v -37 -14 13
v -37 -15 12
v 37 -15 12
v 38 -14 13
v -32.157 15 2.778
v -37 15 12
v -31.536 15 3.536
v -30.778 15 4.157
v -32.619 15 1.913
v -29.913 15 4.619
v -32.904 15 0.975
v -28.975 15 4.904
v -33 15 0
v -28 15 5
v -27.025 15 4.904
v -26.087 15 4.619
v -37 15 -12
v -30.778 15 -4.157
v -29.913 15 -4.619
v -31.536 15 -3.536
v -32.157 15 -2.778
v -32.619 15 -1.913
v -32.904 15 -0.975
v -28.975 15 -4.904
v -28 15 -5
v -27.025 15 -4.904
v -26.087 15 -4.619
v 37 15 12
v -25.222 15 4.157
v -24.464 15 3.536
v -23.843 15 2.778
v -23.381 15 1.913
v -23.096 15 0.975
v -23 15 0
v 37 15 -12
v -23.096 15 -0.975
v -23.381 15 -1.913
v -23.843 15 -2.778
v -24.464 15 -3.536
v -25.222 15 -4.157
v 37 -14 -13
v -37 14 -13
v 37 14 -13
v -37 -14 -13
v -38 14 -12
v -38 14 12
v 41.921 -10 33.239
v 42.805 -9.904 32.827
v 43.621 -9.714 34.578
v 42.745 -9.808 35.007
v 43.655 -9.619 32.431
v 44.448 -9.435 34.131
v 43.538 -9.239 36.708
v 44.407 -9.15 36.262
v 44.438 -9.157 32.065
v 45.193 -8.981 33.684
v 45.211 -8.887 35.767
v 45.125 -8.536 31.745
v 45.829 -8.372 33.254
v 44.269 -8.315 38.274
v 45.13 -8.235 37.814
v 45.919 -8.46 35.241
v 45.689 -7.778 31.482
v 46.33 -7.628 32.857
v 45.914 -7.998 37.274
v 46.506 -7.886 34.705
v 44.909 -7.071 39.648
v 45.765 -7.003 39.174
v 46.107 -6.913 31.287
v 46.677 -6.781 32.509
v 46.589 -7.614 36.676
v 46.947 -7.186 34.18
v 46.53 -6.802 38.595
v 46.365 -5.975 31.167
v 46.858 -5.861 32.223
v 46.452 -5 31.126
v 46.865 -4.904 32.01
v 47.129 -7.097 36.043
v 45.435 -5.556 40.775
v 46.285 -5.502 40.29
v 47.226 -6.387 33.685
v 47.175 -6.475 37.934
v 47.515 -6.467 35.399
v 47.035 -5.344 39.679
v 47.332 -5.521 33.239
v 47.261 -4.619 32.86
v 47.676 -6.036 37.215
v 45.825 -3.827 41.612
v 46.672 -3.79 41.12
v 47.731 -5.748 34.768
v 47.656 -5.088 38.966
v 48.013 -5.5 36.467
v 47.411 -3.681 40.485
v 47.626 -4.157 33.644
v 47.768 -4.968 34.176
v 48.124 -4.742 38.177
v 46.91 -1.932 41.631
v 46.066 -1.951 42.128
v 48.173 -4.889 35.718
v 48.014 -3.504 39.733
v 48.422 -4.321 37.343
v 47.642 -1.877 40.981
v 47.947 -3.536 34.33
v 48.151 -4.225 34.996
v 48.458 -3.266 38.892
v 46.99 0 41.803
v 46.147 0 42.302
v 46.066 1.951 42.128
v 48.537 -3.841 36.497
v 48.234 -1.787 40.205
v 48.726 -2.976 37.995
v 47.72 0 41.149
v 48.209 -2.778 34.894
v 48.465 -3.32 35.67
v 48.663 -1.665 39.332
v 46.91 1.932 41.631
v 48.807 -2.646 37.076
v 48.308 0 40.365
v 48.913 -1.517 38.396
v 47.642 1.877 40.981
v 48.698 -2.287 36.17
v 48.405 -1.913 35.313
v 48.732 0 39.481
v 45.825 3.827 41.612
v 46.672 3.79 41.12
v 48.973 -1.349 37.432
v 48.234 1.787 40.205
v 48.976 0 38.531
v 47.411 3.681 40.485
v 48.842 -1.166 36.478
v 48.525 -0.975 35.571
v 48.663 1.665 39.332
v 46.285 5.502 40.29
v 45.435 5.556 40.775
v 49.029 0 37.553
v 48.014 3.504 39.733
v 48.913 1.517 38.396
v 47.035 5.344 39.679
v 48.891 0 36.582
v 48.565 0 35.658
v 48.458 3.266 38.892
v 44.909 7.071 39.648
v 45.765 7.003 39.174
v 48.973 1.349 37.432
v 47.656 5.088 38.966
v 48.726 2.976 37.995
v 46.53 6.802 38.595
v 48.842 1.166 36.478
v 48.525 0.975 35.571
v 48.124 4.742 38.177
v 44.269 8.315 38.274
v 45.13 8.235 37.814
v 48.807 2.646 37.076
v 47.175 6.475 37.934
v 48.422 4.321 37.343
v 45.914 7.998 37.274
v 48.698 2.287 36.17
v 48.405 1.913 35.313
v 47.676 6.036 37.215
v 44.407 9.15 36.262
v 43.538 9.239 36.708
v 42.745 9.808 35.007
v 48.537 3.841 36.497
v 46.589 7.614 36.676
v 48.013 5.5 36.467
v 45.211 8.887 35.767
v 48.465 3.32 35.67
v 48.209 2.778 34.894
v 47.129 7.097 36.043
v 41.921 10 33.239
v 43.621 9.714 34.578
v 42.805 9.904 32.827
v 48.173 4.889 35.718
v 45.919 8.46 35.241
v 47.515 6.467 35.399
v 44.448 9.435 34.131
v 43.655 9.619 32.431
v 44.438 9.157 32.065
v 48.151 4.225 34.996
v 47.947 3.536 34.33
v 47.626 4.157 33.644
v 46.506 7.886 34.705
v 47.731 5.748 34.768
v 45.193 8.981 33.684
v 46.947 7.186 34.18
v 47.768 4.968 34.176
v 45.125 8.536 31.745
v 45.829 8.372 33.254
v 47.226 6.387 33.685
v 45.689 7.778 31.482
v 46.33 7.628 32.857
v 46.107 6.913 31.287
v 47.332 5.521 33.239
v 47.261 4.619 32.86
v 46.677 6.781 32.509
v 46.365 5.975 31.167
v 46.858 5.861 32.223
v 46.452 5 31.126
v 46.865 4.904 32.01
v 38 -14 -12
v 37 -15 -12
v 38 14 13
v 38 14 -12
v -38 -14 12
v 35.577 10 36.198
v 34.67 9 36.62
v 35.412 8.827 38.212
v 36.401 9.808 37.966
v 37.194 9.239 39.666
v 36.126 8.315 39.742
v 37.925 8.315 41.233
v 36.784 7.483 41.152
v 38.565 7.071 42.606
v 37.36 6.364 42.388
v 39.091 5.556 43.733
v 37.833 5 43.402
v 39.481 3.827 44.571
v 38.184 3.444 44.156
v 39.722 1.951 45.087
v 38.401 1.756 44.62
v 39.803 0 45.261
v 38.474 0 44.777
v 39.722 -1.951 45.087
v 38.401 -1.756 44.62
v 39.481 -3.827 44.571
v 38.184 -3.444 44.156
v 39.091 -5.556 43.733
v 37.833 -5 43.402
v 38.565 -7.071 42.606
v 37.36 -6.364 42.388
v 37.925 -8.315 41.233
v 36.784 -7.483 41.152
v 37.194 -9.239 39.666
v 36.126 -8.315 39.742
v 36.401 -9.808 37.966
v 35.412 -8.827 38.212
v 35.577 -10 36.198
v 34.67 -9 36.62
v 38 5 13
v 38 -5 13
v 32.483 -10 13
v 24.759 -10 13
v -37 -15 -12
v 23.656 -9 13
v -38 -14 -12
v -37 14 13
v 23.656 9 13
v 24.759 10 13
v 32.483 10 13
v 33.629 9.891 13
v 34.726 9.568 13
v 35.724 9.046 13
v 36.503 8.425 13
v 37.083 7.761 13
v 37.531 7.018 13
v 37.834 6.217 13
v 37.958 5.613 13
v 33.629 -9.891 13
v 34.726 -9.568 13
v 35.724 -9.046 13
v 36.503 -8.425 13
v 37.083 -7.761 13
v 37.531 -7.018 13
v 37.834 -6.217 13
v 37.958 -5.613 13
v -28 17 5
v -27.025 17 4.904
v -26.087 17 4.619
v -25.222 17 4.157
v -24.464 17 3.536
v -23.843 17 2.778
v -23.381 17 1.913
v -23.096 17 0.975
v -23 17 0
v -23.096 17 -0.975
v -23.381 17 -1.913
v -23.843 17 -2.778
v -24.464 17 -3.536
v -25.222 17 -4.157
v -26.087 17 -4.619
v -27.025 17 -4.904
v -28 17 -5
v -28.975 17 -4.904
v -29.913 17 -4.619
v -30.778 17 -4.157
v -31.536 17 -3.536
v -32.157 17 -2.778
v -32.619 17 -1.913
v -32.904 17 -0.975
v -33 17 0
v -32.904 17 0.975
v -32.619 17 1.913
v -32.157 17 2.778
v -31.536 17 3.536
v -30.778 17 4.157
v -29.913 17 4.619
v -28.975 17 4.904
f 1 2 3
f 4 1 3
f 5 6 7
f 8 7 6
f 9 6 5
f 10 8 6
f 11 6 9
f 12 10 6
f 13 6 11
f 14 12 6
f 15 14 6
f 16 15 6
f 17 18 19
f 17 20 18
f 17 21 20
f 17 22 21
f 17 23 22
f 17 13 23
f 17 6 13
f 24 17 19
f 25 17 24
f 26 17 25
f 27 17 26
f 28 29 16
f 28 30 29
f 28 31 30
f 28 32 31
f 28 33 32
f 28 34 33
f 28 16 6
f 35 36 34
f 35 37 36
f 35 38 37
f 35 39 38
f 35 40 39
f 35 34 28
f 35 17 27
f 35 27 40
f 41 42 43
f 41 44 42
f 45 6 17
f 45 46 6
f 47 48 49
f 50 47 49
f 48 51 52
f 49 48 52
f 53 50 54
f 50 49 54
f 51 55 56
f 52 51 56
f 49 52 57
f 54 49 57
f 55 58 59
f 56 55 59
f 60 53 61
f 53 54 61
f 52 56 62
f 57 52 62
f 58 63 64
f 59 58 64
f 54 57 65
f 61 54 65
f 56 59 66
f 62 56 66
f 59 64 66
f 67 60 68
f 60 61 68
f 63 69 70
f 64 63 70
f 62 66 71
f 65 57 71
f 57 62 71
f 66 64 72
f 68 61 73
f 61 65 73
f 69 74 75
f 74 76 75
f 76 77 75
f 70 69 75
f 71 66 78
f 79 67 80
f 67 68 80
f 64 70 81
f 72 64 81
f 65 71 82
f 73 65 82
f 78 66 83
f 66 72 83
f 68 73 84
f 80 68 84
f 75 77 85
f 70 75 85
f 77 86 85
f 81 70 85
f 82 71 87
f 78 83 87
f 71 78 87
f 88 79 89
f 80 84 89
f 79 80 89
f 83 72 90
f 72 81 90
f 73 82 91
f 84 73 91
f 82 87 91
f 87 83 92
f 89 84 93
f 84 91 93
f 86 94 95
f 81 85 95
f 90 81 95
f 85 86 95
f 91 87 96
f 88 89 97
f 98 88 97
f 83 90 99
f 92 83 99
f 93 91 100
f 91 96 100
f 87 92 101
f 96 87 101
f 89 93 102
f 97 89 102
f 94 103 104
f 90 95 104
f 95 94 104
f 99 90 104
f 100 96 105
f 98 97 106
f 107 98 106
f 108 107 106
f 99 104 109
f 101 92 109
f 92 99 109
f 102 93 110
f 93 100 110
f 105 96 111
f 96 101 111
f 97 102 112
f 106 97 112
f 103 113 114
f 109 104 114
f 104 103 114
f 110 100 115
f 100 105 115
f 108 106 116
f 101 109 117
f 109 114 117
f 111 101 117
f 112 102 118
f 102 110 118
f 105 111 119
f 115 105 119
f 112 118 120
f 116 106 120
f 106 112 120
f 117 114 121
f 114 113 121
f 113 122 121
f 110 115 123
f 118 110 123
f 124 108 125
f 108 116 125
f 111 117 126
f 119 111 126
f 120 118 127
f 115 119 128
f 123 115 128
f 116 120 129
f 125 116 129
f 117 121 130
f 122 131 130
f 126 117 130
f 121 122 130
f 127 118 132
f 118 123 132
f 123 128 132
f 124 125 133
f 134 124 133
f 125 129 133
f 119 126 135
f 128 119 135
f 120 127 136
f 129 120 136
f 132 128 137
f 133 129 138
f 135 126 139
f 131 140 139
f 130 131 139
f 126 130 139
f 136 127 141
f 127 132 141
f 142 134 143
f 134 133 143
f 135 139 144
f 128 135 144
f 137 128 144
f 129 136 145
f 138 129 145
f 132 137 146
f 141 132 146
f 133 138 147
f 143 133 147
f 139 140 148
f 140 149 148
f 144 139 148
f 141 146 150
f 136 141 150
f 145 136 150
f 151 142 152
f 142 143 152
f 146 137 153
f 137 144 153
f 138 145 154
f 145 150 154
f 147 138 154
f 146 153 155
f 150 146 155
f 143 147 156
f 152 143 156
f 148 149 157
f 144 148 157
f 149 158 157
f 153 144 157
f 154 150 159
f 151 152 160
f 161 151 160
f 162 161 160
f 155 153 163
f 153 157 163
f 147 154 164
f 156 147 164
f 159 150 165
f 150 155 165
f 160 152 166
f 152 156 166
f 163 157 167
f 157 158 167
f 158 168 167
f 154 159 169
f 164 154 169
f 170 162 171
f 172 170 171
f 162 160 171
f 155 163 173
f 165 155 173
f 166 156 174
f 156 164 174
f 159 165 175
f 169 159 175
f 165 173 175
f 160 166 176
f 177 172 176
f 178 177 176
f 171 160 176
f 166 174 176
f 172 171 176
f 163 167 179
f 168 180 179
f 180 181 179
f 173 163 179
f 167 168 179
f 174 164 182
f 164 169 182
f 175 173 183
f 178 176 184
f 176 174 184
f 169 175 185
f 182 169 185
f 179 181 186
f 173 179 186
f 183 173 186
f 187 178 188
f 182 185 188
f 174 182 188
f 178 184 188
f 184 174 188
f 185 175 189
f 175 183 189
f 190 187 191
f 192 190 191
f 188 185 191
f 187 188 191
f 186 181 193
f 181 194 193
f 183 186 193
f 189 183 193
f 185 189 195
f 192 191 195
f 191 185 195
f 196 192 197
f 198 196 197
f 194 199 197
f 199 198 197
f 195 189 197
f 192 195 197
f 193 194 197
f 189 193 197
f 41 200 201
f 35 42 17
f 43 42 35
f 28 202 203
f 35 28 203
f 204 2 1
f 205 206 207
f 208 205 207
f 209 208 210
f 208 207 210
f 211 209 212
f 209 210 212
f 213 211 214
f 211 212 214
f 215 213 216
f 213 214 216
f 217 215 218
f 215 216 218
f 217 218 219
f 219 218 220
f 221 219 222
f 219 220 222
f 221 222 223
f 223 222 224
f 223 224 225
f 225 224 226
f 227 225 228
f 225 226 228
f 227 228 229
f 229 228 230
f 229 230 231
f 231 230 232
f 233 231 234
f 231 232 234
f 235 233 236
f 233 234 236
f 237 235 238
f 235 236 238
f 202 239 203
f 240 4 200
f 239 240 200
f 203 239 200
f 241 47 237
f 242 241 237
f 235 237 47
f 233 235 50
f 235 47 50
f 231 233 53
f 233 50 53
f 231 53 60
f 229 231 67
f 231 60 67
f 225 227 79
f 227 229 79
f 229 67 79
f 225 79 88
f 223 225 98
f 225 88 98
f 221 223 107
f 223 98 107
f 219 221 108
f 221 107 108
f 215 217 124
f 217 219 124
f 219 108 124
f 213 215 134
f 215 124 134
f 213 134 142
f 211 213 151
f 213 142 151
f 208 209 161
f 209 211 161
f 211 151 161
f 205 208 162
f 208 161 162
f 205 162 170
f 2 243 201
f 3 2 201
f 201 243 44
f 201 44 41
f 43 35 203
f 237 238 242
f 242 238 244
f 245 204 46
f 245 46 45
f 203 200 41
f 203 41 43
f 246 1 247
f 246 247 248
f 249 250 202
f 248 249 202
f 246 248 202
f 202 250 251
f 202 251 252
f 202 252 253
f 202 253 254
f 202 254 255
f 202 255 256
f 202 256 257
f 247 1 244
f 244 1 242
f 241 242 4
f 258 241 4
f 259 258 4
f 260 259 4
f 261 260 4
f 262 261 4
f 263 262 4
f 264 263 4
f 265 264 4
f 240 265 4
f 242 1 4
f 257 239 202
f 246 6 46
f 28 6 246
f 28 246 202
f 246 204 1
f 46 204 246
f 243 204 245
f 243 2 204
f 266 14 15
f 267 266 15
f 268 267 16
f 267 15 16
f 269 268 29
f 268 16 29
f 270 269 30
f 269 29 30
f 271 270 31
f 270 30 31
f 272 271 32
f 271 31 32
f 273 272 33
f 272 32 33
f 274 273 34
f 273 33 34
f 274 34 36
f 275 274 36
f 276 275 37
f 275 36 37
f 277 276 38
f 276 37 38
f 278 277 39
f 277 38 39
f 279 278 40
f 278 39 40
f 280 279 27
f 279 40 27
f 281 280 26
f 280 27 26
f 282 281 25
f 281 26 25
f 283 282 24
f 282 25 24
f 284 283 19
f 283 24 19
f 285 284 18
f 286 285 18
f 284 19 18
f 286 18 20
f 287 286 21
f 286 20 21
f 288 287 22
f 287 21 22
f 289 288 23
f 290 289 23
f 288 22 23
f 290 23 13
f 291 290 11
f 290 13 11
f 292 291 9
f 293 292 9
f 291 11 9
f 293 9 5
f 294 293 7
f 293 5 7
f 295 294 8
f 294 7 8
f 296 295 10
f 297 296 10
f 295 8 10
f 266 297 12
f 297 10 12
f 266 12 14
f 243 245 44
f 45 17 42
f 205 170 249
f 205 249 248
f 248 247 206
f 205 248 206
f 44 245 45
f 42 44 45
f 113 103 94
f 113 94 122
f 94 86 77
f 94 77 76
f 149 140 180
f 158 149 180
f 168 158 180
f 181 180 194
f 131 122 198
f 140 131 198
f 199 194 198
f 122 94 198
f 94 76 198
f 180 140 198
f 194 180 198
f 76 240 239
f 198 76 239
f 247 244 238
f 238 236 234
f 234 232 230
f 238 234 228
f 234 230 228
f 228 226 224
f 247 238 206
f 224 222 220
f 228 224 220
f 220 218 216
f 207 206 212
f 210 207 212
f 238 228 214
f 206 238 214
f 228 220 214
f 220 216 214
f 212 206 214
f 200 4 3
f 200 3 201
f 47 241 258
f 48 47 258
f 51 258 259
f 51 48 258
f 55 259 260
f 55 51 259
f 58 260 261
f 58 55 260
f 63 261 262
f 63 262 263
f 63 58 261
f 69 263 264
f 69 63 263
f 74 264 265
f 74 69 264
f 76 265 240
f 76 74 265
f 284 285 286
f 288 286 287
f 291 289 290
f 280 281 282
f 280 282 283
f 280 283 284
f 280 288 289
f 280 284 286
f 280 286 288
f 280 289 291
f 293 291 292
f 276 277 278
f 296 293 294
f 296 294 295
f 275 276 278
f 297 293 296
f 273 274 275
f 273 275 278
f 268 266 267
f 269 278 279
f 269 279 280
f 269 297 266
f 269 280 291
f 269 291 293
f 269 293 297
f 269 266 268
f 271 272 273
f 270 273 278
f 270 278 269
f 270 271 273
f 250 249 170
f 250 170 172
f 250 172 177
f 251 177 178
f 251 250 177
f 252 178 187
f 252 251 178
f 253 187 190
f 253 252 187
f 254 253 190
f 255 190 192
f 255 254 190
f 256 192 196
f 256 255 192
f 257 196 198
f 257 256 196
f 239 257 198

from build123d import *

# Parameters (mm, degrees)
BOSS_EXTRUDE1_DEPTH      = 15
BOSS_EXTRUDE1_DEPTH_BACK = 15
SKETCH1_W                = 76
SKETCH1_H                = 26
BOSS_EXTRUDE2_DEPTH      = 13
BOSS_EXTRUDE3_REACH      = 66.525
SKETCH3_W                = 13
SKETCH3_H                = 20
FILLET1_R                = 5
CHAMFER1_SIZE            = 1
SKETCH4_R                = 5
BOSS_EXTRUDE4_DEPTH      = 2


with BuildPart() as part:
    # Sketch1 → Boss-Extrude1 (new, two sides: drawn at the far end of the back side and taken through both)
    with BuildSketch(Plane(origin=(0, 0, 0), x_dir=(1, 0, 0), z_dir=(0, 1, 0)).offset(-BOSS_EXTRUDE1_DEPTH_BACK)):
        Rectangle(SKETCH1_W, SKETCH1_H)
    extrude(amount=BOSS_EXTRUDE1_DEPTH + BOSS_EXTRUDE1_DEPTH_BACK)

    # Sketch3 → Boss-Extrude3 (add, up to next)
    with BuildSketch(Plane(origin=(11.766324296, 0, 25.232963882), x_dir=(-0.9063077870366482, 0, 0.4226182617407034), z_dir=(-0.4226182617407034, 0, -0.9063077870366482)), mode=Mode.PRIVATE) as boss_extrude3_sk1:
        with Locations((-22.445658505, 0)):
            Rectangle(SKETCH3_W, SKETCH3_H)
    boss_extrude3_tool1 = extrude(boss_extrude3_sk1.sketch, amount=BOSS_EXTRUDE3_REACH, mode=Mode.PRIVATE) - part.part


with BuildPart() as body_2:
    # Sketch2 → Boss-Extrude2 (new body)
    with BuildSketch(Plane(origin=(26.233675704, 0, -12.232963882), x_dir=(0, 1, 0), z_dir=(-0.9063077870366482, 0, 0.42261826174070327))):
        with BuildLine():
            Line((10, -27.841495178), (-10, -27.841495178))
            Line((-10, -27.841495178), (-10, -47.841495178))
            ThreePointArc((-10, -47.841495178), (0, -57.841495178), (10, -47.841495178))
            Line((10, -47.841495178), (10, -27.841495178))
        make_face()
    extrude(amount=BOSS_EXTRUDE2_DEPTH)


with BuildPart() as part_1:
    add(part.part)

    add(body_2.part)  # Boss-Extrude3 merges body 2
    add(boss_extrude3_tool1.solids().sort_by_distance((32.108999, 0, 15.747019))[0])

    # Fillet1
    fillet1_edges = [part_1.edges().sort_by_distance(p)[0] for p in [
        (42.226182617, -10, 22.06307787),
        (42.226182617, 10, 22.06307787),
        (50.678547852, 0, 40.189233611),
    ]]
    fillet(fillet1_edges, radius=FILLET1_R)

    # Chamfer1
    chamfer1_edges = [part_1.edges().sort_by_distance(p)[0] for p in [
        (29.163225528, -10, 24.810096572),
        (38.896546621, 0, 45.683271014),
        (29.163225528, 10, 24.810096572),
        (0, -15, -13),
        (0, -15, 13),
        (38, -15, 0),
        (-38, -15, 0),
        (-38, 0, -13),
        (-38, 0, 13),
        (0, 15, 13),
        (-38, 15, 0),
        (0, 15, -13),
        (38, 15, 0),
        (38, 0, -13),
    ]]
    chamfer(chamfer1_edges, length=CHAMFER1_SIZE)

    # Sketch4 → Boss-Extrude4 (add)
    with BuildSketch(Plane(origin=(0, 15, 0), x_dir=(1, 0, 0), z_dir=(0, 1, 0))):
        with Locations((-28, 0)):
            Circle(SKETCH4_R)
    extrude(amount=BOSS_EXTRUDE4_DEPTH)


solid = part_1.part
